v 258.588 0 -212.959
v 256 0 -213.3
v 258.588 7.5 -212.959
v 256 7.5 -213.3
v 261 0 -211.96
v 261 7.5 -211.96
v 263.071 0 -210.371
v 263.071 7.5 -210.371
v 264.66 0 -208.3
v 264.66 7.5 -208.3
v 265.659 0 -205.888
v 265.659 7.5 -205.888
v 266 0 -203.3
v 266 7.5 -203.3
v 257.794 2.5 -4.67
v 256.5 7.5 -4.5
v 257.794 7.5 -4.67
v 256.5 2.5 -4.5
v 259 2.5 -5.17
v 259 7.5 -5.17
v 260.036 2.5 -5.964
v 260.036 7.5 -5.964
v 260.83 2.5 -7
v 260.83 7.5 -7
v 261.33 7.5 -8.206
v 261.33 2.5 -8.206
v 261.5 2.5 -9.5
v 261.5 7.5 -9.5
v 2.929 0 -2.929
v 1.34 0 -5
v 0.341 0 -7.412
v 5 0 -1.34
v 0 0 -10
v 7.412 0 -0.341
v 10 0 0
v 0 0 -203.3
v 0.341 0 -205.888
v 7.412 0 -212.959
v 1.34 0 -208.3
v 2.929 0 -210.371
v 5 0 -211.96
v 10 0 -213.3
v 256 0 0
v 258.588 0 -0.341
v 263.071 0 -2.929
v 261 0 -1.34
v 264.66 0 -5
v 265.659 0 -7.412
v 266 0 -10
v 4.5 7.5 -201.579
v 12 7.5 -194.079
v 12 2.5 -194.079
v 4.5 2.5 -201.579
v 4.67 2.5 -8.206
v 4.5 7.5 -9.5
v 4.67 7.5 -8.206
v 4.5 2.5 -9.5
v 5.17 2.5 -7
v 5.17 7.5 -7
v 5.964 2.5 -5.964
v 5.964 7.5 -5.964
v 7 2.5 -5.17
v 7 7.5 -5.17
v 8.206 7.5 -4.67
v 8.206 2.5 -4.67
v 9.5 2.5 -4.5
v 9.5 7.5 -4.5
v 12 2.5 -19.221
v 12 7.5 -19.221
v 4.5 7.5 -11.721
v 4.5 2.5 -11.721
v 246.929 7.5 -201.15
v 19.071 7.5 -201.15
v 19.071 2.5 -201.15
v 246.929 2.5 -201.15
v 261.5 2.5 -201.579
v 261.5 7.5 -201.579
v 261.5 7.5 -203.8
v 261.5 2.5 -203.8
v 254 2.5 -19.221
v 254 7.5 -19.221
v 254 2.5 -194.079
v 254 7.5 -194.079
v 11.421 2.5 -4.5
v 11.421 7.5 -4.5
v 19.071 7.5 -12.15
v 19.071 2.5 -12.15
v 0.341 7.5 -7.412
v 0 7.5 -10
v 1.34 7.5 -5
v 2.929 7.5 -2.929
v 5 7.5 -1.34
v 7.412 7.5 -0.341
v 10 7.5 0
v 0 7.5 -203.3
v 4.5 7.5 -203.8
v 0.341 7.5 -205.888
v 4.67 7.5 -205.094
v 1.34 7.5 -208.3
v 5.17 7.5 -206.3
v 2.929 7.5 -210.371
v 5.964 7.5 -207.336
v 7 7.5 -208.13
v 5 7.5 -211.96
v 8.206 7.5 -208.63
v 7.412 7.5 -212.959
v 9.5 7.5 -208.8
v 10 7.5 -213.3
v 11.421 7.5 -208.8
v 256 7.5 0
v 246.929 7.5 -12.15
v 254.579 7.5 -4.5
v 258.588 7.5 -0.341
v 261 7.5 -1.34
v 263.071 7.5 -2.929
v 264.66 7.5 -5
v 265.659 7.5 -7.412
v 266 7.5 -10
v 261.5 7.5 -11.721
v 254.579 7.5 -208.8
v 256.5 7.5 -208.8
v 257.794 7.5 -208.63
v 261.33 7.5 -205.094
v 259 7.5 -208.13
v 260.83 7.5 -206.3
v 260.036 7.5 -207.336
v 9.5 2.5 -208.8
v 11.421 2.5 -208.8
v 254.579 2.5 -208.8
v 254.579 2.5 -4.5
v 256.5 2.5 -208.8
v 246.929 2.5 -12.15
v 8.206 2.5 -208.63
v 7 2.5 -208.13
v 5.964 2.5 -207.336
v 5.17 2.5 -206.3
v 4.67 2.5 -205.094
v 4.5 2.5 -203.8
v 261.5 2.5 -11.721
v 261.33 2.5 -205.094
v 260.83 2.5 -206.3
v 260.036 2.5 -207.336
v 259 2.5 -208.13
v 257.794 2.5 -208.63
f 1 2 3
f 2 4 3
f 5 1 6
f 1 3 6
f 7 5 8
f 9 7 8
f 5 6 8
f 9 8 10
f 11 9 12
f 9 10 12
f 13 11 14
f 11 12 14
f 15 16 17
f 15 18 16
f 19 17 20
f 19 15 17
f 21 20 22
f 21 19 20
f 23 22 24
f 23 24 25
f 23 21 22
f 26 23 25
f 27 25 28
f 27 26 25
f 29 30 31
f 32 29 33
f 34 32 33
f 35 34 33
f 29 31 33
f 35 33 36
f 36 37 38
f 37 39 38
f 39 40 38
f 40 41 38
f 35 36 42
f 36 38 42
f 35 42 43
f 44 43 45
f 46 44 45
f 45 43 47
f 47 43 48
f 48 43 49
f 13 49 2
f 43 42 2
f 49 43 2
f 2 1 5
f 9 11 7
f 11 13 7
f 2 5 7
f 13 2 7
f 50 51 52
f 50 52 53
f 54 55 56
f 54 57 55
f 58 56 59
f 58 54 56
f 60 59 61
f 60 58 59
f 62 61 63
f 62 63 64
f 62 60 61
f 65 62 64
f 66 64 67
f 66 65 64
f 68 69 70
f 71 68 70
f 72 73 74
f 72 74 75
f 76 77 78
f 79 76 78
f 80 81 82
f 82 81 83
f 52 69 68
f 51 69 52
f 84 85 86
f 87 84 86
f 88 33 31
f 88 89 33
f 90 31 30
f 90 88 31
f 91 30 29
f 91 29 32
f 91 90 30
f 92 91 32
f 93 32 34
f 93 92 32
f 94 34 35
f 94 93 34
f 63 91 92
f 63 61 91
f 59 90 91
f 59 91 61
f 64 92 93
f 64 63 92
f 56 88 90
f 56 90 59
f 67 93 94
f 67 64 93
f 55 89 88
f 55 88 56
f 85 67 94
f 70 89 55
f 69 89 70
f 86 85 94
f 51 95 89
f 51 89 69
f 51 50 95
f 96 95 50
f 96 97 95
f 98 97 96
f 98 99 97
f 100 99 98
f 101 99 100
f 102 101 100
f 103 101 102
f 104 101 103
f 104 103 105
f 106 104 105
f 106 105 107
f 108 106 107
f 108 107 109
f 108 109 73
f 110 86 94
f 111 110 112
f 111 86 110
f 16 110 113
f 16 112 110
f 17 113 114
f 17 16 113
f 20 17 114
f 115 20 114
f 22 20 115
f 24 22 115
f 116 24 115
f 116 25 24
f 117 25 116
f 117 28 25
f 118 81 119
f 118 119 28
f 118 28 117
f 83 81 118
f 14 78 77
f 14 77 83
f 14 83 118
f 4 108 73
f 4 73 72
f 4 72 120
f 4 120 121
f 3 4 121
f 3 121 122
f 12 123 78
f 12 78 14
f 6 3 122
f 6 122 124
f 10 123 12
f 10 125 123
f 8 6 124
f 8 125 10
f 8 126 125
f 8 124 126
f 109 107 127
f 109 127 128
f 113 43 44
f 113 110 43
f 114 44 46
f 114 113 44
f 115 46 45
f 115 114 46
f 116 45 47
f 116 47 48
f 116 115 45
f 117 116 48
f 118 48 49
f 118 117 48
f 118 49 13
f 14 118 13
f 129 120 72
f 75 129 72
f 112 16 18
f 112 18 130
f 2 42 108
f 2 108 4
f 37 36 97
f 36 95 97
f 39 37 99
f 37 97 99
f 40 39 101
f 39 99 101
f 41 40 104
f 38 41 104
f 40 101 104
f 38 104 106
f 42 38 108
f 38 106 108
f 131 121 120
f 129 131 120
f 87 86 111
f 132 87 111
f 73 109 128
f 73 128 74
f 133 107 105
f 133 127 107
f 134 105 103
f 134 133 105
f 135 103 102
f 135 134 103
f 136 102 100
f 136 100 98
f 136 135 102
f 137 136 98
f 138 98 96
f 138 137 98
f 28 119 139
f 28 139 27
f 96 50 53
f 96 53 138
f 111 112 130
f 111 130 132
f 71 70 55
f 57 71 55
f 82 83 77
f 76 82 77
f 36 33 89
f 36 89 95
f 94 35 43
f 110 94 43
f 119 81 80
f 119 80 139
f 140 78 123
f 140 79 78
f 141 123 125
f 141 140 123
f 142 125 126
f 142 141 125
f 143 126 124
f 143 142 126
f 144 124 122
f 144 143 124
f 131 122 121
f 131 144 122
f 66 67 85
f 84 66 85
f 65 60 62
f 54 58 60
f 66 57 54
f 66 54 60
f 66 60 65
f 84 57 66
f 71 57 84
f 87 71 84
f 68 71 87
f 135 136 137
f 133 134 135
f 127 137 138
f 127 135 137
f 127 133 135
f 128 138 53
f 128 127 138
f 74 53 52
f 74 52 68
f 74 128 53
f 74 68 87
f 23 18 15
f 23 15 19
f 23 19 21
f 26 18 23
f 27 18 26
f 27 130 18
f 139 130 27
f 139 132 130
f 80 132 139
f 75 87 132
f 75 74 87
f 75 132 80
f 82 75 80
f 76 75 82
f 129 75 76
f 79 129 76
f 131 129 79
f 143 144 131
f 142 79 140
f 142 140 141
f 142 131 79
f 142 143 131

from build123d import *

# Parameters (mm, degrees)
SKETCH1_W           = 266
SKETCH1_H           = 213.3
BOSS_EXTRUDE1_DEPTH = 7.5
SKETCH2_W           = 242
SKETCH2_H           = 189
CUT_EXTRUDE1_DEPTH  = 5
CUT_EXTRUDE2_DEPTH  = 5
FILLET1_R           = 5
FILLET2_R           = 10


with BuildPart() as part:
    # Sketch1 → Boss-Extrude1 (new body)
    with BuildSketch(Plane(origin=(0, 0, 0), x_dir=(1, 0, 0), z_dir=(0, 1, 0))):
        with Locations((133, 106.65)):
            Rectangle(SKETCH1_W, SKETCH1_H)
    extrude(amount=BOSS_EXTRUDE1_DEPTH)

    # Sketch2 → Cut-Extrude1 (cut)
    with BuildSketch(Plane(origin=(0, 7.5, 0), x_dir=(1, 0, 0), z_dir=(0, 1, 0))):
        with Locations((133, 106.65)):
            Rectangle(SKETCH2_W, SKETCH2_H)
    extrude(amount=-CUT_EXTRUDE1_DEPTH, mode=Mode.SUBTRACT)

    # Sketch3 → Cut-Extrude2 (cut)
    with BuildSketch(Plane(origin=(0, 7.5, 0), x_dir=(1, 0, 0), z_dir=(0, 1, 0))):
        Polygon((12, 194.078932188), (4.5, 201.578932188), (4.5, 208.8), (11.421067812, 208.8), (19.071067812, 201.15), align=None)
        Polygon((19.071067812, 12.15), (12, 19.221067812), (4.5, 11.721067812), (4.5, 4.5), (11.421067812, 4.5), align=None)
        Polygon((254, 19.221067812), (261.5, 11.721067812), (261.5, 4.5), (254.578932188, 4.5), (246.928932188, 12.15), align=None)
        Polygon((246.928932188, 201.15), (254, 194.078932188), (261.5, 201.578932188), (261.5, 208.8), (254.578932188, 208.8), align=None)
    extrude(amount=-CUT_EXTRUDE2_DEPTH, mode=Mode.SUBTRACT)

    # Fillet1
    fillet1_edges = [part.edges().sort_by_distance(p)[0] for p in [
        (4.5, 5, -208.8),
        (4.5, 5, -4.5),
        (261.5, 5, -4.5),
        (261.5, 5, -208.8),
    ]]
    fillet(fillet1_edges, radius=FILLET1_R)

    # Fillet2
    fillet2_edges = [part.edges().sort_by_distance(p)[0] for p in [
        (0, 3.75, -213.3),
        (266, 3.75, -213.3),
        (266, 3.75, 0),
        (0, 3.75, 0),
    ]]
    fillet(fillet2_edges, radius=FILLET2_R)


solid = part.part
